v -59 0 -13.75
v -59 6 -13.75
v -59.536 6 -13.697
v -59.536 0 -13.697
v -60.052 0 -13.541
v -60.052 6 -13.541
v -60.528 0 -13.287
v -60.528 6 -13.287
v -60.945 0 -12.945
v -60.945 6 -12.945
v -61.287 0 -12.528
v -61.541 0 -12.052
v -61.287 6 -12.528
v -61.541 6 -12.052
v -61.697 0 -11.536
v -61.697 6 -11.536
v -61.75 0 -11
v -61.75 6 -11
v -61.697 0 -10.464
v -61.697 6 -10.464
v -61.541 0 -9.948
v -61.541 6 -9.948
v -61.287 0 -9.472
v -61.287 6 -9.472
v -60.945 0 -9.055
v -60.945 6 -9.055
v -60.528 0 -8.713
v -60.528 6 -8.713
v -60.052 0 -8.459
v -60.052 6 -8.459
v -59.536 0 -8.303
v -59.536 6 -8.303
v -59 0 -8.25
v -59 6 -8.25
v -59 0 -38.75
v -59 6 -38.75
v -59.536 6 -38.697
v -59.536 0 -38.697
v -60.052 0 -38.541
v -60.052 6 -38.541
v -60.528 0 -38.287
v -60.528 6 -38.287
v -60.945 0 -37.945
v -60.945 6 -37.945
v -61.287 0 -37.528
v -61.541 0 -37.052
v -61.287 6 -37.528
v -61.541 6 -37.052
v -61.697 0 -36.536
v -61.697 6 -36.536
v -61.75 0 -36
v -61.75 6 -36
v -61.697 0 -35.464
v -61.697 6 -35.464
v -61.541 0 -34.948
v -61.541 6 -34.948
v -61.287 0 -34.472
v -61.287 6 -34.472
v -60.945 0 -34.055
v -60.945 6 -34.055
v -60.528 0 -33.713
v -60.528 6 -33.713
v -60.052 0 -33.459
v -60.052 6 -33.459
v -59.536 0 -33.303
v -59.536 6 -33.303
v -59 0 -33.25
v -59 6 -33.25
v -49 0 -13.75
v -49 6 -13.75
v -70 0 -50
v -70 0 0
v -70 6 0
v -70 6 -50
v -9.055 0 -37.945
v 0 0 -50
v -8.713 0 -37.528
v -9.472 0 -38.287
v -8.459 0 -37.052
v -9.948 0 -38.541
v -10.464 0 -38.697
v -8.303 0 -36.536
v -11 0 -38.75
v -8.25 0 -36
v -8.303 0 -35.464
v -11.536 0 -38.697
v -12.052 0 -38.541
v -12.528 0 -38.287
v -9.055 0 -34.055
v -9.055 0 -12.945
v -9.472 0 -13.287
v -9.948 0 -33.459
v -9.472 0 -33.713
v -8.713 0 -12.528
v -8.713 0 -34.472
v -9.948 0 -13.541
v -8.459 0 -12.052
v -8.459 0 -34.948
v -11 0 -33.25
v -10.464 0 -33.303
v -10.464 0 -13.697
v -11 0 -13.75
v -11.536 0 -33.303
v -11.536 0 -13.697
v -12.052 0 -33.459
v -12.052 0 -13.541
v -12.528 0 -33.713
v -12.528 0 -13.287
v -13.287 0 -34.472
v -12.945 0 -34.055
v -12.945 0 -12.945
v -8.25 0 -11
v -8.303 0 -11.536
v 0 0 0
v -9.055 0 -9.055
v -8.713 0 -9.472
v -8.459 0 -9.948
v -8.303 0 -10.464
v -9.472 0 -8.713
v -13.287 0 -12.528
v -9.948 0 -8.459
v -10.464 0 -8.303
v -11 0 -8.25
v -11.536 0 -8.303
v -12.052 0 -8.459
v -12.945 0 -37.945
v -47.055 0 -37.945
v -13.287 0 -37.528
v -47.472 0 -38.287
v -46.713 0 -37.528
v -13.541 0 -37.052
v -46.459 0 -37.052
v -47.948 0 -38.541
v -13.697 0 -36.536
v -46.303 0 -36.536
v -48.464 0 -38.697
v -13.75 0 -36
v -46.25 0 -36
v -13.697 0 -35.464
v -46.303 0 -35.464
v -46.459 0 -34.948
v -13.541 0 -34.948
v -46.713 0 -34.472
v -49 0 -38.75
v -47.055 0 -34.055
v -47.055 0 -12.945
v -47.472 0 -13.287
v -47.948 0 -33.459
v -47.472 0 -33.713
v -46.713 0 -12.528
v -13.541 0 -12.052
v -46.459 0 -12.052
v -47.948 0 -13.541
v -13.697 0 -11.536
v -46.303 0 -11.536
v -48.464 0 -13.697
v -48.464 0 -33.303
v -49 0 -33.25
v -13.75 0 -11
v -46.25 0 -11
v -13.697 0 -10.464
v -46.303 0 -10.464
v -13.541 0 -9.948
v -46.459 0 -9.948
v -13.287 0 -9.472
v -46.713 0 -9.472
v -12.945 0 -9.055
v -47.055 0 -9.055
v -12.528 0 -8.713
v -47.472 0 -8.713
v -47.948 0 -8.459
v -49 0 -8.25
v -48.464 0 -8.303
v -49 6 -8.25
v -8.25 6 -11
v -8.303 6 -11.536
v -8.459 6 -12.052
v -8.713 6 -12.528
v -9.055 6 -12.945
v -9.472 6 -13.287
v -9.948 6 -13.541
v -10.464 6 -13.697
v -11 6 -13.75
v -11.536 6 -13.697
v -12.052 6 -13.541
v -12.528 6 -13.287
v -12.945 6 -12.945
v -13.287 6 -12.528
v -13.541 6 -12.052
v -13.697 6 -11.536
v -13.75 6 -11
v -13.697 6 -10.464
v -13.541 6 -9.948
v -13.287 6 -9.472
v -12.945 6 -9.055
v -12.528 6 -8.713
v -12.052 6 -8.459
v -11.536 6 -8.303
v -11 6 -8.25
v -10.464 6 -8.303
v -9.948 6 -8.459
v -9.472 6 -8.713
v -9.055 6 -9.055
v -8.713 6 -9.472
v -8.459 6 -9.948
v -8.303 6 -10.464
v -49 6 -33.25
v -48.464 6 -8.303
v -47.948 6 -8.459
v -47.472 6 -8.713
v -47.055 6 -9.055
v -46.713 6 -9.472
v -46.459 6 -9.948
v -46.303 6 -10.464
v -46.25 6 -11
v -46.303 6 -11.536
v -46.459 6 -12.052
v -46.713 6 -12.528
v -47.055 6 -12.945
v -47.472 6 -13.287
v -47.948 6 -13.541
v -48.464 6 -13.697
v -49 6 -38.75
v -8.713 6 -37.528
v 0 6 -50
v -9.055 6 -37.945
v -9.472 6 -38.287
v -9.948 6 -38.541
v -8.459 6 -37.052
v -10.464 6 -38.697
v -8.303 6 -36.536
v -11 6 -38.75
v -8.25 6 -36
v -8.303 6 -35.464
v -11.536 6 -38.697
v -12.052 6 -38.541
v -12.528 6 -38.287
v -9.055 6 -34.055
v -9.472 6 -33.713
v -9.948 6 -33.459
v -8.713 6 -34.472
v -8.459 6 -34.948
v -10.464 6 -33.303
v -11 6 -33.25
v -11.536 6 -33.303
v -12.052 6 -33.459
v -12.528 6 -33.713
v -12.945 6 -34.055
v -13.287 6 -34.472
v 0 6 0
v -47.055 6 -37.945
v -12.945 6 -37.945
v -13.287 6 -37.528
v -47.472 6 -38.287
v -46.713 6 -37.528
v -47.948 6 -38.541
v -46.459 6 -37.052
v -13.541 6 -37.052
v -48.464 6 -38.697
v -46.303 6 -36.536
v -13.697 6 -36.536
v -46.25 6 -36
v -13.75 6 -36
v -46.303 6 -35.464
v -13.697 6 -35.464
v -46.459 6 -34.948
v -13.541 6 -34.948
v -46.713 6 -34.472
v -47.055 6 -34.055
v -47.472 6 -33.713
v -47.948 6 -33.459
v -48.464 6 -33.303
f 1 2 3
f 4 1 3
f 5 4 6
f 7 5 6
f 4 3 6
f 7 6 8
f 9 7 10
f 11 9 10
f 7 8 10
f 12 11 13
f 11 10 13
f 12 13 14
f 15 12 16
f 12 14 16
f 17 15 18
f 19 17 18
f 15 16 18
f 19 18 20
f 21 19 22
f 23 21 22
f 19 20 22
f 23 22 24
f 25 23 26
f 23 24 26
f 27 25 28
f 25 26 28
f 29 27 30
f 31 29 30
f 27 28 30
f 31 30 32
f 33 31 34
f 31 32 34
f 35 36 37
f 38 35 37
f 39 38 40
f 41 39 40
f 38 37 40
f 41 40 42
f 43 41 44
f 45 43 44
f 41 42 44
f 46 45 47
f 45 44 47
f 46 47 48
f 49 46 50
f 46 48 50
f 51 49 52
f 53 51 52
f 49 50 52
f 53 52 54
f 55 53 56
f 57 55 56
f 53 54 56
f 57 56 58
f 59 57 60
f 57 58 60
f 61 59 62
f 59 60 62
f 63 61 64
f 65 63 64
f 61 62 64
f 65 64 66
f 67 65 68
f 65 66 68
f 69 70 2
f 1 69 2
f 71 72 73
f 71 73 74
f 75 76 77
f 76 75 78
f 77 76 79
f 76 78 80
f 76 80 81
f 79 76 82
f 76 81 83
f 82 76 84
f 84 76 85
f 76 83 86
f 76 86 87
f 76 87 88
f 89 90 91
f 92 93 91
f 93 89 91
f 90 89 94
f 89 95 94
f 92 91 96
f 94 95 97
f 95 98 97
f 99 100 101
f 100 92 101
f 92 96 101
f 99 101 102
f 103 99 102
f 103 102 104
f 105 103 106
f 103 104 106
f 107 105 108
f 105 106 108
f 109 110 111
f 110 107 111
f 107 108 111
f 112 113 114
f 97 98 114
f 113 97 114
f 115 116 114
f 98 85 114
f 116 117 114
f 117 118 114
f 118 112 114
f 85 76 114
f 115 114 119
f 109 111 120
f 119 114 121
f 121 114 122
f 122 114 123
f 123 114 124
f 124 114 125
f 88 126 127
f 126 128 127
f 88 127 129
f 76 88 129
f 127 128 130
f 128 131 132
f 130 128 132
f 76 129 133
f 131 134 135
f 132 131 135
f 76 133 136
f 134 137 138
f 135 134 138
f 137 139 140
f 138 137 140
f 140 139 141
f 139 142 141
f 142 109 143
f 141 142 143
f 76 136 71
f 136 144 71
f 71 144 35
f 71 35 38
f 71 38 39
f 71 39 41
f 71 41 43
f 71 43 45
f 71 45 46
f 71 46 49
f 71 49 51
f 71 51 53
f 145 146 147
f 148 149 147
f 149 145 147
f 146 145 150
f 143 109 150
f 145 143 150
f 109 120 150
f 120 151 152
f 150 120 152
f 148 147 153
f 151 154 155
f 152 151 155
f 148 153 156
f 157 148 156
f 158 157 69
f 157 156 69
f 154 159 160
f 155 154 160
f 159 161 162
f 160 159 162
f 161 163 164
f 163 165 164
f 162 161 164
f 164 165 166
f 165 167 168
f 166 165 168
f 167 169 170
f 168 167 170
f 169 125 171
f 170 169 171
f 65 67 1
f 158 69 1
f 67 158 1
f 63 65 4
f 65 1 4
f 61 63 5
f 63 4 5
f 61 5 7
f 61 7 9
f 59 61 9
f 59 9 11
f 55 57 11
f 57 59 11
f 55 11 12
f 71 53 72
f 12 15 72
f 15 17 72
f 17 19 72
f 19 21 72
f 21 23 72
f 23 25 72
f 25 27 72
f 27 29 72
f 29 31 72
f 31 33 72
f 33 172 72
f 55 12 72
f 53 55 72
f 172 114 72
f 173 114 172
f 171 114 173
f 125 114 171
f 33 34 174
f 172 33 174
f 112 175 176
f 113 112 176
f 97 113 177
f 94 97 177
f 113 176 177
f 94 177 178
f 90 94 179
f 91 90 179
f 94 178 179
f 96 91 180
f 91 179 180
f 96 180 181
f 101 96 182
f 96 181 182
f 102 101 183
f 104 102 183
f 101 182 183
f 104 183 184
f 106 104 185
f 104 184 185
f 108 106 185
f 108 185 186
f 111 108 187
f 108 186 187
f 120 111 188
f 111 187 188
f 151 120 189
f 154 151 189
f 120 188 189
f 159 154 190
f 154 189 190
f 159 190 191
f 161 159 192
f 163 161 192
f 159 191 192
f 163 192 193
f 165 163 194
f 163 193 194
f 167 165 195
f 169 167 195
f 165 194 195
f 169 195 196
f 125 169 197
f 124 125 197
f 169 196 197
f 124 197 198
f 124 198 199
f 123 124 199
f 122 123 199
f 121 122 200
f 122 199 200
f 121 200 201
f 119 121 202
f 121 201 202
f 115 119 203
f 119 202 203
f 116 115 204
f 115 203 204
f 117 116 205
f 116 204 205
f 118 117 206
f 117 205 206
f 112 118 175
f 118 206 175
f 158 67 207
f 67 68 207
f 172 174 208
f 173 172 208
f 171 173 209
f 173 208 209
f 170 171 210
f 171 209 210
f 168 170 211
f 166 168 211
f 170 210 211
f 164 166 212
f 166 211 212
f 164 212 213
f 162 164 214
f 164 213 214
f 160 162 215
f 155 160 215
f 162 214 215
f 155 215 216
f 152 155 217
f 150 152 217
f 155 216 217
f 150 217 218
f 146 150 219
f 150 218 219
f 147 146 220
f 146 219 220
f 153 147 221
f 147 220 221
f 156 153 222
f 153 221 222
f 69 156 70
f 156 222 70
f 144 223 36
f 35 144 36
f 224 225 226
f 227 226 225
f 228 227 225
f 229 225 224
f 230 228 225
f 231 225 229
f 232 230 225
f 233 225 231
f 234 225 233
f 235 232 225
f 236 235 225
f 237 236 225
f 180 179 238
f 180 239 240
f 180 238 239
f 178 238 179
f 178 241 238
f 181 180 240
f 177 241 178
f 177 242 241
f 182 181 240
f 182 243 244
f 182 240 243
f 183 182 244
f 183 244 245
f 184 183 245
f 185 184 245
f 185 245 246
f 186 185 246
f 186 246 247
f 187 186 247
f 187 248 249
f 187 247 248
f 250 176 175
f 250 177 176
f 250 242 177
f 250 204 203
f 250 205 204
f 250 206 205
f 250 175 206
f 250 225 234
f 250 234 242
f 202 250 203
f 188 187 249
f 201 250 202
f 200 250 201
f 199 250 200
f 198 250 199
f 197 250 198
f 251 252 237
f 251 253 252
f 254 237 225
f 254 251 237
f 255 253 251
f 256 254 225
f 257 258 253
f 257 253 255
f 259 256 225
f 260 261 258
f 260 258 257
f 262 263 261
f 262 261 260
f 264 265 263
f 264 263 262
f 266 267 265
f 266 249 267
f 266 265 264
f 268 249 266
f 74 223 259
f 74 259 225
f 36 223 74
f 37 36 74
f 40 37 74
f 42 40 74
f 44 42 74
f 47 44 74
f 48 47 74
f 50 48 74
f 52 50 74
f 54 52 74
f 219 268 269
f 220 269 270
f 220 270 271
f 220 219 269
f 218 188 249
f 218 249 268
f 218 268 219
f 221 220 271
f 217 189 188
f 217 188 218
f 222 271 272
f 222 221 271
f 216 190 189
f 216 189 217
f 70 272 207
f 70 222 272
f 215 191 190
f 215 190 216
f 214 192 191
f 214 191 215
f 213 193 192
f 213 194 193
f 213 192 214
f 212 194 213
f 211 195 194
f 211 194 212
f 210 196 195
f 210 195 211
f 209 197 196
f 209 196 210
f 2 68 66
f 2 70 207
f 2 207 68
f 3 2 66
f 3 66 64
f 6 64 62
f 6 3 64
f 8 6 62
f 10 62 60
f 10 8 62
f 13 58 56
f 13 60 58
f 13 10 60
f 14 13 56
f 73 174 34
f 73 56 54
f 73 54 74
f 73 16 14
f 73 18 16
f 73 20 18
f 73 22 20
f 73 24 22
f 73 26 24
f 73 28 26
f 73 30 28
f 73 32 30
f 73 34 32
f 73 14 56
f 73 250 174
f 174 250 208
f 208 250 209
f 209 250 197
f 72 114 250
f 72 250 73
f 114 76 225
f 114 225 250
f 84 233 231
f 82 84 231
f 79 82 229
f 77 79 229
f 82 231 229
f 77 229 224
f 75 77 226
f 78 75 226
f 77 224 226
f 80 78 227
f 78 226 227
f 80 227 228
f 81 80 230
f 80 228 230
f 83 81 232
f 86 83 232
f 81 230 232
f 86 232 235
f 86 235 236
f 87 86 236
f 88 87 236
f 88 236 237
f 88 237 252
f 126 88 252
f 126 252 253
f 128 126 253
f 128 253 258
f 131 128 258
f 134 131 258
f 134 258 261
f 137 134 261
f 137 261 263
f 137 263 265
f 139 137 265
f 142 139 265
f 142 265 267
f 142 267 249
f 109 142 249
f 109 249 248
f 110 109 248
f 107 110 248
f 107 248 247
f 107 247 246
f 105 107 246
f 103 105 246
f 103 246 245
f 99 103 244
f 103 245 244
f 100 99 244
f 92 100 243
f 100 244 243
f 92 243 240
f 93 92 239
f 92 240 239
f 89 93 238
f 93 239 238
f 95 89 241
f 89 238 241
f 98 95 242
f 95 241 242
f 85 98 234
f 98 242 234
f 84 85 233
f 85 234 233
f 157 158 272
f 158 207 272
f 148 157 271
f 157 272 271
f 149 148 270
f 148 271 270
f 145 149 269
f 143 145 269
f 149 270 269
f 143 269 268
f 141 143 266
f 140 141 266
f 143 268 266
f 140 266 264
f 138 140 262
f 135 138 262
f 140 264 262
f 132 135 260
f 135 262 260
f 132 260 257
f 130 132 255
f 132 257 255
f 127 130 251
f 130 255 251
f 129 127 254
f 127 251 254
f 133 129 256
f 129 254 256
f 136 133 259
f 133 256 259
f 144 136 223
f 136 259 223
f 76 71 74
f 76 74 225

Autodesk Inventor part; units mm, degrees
ref_plane "YZ Plane" through (0, 0, 0) normal (1, 0, 0) x (0, 1, 0)
ref_plane "XZ Plane" through (0, 0, 0) normal (0, 1, 0) x (-1, 0, 0)
ref_plane "XY Plane" through (0, 0, 0) normal (0, 0, 1) x (1, 0, 0)
sketch "Sketch1" plane through (0, 0, 0) normal (0, 1, 0) x (-1, 0, 0)
  line L0 (0, 0) -> (70, 0)
  line L1 (70, 0) -> (70, -50)
  line L2 (70, -50) -> (0, -50)
  line L3 (0, -50) -> (0, 0)
  dimension "d0" = 70
  dimension "d1" = 50
extrude "Extrusion1" add sketch "Sketch1" along normal blind 6
sketch "Sketch2" plane through (0, 6, 0) normal (0, 1, 0) x (1, 0, 0)
  circle A0 centre (-11, 11) radius 2.75
  line L0 (0, 0) -> (0, 50) projected
  line L1 (-70, 0) -> (0, 0) projected
  dimension "d4" = 5.5
  dimension "d5" = 11
  dimension "d6" = 11
extrude "Extrusion2" cut sketch "Sketch2" against normal through all
pattern_linear "Rectangular Pattern1" count 2 spacing 38 along (-1, 0, 0) count 2 spacing 25 along (0, 0, -1) of "Extrusion2"
sketch "Sketch3" plane through (0, 6, 0) normal (0, 1, 0) x (1, 0, 0)
  circle A0 centre (-49, 11) radius 2.75 projected
  line L0 (-49, 11) -> (-59, 11) construction
  line L1 (-49, 13.75) -> (-59, 13.75)
  line L2 (-59, 8.25) -> (-49, 8.25)
  arc A1 (-49, 8.25) -> (-49, 13.75) centre (-49, 11) ccw
  arc A2 (-59, 13.75) -> (-59, 8.25) centre (-59, 11) ccw
  circle A3 centre (-49, 36) radius 2.75 projected
  line L3 (-49, 36) -> (-59, 36) construction
  line L4 (-49, 38.75) -> (-59, 38.75)
  line L5 (-59, 33.25) -> (-49, 33.25)
  arc A4 (-49, 33.25) -> (-49, 38.75) centre (-49, 36) ccw
  arc A5 (-59, 38.75) -> (-59, 33.25) centre (-59, 36) ccw
  point P0 (0, 0)
  point P1 (-54, 11)
  point P2 (-54, 36)
  dimension "d15" = 10
  dimension "d16" = 5.5
  dimension "d17" = 10
  dimension "d18" = 5.5
extrude "Extrusion3" cut sketch "Sketch3" against normal through all
properties part number "Y_Carriage_Plate"
